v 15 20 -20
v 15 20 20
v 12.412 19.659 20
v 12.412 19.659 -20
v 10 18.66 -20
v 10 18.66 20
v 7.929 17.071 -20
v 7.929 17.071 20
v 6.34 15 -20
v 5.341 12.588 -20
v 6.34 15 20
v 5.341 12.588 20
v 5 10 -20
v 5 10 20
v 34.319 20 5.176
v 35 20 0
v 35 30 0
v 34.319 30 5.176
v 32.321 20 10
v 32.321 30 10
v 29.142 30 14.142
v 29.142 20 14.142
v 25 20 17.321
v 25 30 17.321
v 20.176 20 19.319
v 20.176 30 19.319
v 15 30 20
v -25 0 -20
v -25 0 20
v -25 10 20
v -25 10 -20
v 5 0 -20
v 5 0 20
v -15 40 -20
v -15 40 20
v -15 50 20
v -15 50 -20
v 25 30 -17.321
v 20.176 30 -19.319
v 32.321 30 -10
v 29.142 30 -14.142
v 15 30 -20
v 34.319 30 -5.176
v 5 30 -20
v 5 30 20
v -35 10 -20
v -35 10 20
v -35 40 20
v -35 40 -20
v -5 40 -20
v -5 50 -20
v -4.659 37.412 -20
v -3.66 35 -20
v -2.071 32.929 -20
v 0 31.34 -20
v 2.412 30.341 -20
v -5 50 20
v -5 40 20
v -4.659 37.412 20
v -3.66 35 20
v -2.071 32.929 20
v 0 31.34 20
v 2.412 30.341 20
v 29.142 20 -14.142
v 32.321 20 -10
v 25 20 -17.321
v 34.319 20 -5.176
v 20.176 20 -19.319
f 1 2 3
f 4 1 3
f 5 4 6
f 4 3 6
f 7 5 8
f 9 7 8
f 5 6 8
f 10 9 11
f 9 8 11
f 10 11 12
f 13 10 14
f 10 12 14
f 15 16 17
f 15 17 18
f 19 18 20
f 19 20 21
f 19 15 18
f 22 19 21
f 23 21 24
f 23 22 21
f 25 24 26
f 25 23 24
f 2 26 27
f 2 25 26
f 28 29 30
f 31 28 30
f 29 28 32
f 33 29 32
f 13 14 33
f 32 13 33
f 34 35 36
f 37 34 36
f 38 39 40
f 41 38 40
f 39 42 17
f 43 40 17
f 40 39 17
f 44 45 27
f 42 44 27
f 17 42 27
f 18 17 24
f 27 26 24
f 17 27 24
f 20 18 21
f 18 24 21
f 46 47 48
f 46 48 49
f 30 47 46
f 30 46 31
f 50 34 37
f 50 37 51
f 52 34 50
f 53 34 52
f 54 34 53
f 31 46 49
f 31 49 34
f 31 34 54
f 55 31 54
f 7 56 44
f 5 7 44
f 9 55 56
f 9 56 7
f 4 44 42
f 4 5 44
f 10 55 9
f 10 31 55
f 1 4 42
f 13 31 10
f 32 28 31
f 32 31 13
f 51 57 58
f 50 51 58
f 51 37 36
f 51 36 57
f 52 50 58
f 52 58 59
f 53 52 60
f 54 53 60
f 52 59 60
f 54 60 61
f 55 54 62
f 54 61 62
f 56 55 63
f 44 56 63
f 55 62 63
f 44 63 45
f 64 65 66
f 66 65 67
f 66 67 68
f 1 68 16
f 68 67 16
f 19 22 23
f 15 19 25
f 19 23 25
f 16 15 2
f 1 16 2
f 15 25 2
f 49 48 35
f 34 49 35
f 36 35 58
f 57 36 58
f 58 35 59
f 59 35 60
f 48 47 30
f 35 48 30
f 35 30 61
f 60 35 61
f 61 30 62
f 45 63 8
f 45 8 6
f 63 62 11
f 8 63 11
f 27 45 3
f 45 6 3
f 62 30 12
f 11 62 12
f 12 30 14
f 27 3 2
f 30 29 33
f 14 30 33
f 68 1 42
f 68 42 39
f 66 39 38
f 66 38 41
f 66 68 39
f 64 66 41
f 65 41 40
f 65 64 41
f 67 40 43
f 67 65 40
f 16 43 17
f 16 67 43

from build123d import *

# Parameters (mm, degrees)
SKETCH_2_W               = 70
SKETCH_2_H               = 40
EXTRUDE_1_DEPTH          = 50
SKETCH_3_W               = 20
SKETCH_3_H               = 10
SKETCH_3_W_2             = 10
CUT_EXTRUDE_1_DEPTH      = 41
CUT_EXTRUDE_3_DEPTH      = 51
CUT_EXTRUDE_3_DEPTH_BACK = 1


with BuildPart() as part:
    # 草圖2 → 填料-伸長1 (new body)
    with BuildSketch(Plane(origin=(0, 0, 0), x_dir=(1, 0, 0), z_dir=(0, 1, 0))):
        Rectangle(SKETCH_2_W, SKETCH_2_H)
    extrude(amount=EXTRUDE_1_DEPTH)

    # 草圖3 → 除料-伸長1 (cut, through all)
    with BuildSketch(Plane.XY.offset(20)):
        with Locations((-25, 45)):
            Rectangle(SKETCH_3_W, SKETCH_3_H)
        with BuildLine():
            Line((5, 30), (35, 30))
            Line((35, 30), (35, 50))
            Line((35, 50), (-5, 50))
            Line((-5, 50), (-5, 40))
            ThreePointArc((-5, 40), (-2.071067812, 32.928932188), (5, 30))
        make_face()
        with BuildLine():
            Line((5, 10), (5, 0))
            Line((5, 0), (35, 0))
            Line((35, 0), (35, 20))
            Line((35, 20), (15, 20))
            ThreePointArc((15, 20), (7.928932188, 17.071067812), (5, 10))
        make_face()
        with Locations((-30, 5)):
            Rectangle(SKETCH_3_W_2, SKETCH_3_H)
    extrude(amount=-CUT_EXTRUDE_1_DEPTH, mode=Mode.SUBTRACT)

    # 草圖4 → 除料-伸長3 (cut, two sides)
    with BuildSketch(Plane(origin=(0, 0, 0), x_dir=(1, 0, 0), z_dir=(0, 1, 0))) as cut_extrude_3_sk:
        with BuildLine():
            Line((35, 20), (15, 20))
            ThreePointArc((15, 20), (29.142135624, 14.142135624), (35, 0))
            Line((35, 0), (35, 20))
        make_face()
        with BuildLine():
            Line((35, -20), (35, 0))
            ThreePointArc((35, 0), (29.142135624, -14.142135624), (15, -20))
            Line((15, -20), (35, -20))
        make_face()
    extrude(amount=CUT_EXTRUDE_3_DEPTH, mode=Mode.SUBTRACT)
    extrude(cut_extrude_3_sk.sketch, amount=-CUT_EXTRUDE_3_DEPTH_BACK, mode=Mode.SUBTRACT)


solid = part.part
